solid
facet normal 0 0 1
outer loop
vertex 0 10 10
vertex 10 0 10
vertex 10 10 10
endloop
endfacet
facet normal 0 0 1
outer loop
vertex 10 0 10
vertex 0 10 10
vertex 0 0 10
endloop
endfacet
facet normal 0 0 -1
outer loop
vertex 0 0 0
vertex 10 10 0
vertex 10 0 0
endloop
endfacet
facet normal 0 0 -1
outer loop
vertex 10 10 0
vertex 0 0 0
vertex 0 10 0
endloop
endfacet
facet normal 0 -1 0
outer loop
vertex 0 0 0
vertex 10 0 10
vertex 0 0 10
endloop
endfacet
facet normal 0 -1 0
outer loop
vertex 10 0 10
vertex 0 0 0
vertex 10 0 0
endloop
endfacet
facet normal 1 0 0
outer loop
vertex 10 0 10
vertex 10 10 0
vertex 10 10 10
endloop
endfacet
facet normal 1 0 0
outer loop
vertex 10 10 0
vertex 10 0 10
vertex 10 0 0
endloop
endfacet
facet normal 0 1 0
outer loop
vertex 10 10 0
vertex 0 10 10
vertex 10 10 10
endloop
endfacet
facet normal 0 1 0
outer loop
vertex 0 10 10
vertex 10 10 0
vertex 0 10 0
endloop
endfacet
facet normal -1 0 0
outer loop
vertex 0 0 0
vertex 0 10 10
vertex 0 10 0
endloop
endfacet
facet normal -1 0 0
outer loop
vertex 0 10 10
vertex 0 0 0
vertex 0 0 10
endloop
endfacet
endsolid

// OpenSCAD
// OpenSCAD 
// converted from BlockSCAD XML by nicescad's blockscad converter
// according to 
// https://github.com/WolfgangFahl/nicescad/issues/23
// support reading and converting blockscad files #23 
color("green");
cube(10,10,10,center=false);
